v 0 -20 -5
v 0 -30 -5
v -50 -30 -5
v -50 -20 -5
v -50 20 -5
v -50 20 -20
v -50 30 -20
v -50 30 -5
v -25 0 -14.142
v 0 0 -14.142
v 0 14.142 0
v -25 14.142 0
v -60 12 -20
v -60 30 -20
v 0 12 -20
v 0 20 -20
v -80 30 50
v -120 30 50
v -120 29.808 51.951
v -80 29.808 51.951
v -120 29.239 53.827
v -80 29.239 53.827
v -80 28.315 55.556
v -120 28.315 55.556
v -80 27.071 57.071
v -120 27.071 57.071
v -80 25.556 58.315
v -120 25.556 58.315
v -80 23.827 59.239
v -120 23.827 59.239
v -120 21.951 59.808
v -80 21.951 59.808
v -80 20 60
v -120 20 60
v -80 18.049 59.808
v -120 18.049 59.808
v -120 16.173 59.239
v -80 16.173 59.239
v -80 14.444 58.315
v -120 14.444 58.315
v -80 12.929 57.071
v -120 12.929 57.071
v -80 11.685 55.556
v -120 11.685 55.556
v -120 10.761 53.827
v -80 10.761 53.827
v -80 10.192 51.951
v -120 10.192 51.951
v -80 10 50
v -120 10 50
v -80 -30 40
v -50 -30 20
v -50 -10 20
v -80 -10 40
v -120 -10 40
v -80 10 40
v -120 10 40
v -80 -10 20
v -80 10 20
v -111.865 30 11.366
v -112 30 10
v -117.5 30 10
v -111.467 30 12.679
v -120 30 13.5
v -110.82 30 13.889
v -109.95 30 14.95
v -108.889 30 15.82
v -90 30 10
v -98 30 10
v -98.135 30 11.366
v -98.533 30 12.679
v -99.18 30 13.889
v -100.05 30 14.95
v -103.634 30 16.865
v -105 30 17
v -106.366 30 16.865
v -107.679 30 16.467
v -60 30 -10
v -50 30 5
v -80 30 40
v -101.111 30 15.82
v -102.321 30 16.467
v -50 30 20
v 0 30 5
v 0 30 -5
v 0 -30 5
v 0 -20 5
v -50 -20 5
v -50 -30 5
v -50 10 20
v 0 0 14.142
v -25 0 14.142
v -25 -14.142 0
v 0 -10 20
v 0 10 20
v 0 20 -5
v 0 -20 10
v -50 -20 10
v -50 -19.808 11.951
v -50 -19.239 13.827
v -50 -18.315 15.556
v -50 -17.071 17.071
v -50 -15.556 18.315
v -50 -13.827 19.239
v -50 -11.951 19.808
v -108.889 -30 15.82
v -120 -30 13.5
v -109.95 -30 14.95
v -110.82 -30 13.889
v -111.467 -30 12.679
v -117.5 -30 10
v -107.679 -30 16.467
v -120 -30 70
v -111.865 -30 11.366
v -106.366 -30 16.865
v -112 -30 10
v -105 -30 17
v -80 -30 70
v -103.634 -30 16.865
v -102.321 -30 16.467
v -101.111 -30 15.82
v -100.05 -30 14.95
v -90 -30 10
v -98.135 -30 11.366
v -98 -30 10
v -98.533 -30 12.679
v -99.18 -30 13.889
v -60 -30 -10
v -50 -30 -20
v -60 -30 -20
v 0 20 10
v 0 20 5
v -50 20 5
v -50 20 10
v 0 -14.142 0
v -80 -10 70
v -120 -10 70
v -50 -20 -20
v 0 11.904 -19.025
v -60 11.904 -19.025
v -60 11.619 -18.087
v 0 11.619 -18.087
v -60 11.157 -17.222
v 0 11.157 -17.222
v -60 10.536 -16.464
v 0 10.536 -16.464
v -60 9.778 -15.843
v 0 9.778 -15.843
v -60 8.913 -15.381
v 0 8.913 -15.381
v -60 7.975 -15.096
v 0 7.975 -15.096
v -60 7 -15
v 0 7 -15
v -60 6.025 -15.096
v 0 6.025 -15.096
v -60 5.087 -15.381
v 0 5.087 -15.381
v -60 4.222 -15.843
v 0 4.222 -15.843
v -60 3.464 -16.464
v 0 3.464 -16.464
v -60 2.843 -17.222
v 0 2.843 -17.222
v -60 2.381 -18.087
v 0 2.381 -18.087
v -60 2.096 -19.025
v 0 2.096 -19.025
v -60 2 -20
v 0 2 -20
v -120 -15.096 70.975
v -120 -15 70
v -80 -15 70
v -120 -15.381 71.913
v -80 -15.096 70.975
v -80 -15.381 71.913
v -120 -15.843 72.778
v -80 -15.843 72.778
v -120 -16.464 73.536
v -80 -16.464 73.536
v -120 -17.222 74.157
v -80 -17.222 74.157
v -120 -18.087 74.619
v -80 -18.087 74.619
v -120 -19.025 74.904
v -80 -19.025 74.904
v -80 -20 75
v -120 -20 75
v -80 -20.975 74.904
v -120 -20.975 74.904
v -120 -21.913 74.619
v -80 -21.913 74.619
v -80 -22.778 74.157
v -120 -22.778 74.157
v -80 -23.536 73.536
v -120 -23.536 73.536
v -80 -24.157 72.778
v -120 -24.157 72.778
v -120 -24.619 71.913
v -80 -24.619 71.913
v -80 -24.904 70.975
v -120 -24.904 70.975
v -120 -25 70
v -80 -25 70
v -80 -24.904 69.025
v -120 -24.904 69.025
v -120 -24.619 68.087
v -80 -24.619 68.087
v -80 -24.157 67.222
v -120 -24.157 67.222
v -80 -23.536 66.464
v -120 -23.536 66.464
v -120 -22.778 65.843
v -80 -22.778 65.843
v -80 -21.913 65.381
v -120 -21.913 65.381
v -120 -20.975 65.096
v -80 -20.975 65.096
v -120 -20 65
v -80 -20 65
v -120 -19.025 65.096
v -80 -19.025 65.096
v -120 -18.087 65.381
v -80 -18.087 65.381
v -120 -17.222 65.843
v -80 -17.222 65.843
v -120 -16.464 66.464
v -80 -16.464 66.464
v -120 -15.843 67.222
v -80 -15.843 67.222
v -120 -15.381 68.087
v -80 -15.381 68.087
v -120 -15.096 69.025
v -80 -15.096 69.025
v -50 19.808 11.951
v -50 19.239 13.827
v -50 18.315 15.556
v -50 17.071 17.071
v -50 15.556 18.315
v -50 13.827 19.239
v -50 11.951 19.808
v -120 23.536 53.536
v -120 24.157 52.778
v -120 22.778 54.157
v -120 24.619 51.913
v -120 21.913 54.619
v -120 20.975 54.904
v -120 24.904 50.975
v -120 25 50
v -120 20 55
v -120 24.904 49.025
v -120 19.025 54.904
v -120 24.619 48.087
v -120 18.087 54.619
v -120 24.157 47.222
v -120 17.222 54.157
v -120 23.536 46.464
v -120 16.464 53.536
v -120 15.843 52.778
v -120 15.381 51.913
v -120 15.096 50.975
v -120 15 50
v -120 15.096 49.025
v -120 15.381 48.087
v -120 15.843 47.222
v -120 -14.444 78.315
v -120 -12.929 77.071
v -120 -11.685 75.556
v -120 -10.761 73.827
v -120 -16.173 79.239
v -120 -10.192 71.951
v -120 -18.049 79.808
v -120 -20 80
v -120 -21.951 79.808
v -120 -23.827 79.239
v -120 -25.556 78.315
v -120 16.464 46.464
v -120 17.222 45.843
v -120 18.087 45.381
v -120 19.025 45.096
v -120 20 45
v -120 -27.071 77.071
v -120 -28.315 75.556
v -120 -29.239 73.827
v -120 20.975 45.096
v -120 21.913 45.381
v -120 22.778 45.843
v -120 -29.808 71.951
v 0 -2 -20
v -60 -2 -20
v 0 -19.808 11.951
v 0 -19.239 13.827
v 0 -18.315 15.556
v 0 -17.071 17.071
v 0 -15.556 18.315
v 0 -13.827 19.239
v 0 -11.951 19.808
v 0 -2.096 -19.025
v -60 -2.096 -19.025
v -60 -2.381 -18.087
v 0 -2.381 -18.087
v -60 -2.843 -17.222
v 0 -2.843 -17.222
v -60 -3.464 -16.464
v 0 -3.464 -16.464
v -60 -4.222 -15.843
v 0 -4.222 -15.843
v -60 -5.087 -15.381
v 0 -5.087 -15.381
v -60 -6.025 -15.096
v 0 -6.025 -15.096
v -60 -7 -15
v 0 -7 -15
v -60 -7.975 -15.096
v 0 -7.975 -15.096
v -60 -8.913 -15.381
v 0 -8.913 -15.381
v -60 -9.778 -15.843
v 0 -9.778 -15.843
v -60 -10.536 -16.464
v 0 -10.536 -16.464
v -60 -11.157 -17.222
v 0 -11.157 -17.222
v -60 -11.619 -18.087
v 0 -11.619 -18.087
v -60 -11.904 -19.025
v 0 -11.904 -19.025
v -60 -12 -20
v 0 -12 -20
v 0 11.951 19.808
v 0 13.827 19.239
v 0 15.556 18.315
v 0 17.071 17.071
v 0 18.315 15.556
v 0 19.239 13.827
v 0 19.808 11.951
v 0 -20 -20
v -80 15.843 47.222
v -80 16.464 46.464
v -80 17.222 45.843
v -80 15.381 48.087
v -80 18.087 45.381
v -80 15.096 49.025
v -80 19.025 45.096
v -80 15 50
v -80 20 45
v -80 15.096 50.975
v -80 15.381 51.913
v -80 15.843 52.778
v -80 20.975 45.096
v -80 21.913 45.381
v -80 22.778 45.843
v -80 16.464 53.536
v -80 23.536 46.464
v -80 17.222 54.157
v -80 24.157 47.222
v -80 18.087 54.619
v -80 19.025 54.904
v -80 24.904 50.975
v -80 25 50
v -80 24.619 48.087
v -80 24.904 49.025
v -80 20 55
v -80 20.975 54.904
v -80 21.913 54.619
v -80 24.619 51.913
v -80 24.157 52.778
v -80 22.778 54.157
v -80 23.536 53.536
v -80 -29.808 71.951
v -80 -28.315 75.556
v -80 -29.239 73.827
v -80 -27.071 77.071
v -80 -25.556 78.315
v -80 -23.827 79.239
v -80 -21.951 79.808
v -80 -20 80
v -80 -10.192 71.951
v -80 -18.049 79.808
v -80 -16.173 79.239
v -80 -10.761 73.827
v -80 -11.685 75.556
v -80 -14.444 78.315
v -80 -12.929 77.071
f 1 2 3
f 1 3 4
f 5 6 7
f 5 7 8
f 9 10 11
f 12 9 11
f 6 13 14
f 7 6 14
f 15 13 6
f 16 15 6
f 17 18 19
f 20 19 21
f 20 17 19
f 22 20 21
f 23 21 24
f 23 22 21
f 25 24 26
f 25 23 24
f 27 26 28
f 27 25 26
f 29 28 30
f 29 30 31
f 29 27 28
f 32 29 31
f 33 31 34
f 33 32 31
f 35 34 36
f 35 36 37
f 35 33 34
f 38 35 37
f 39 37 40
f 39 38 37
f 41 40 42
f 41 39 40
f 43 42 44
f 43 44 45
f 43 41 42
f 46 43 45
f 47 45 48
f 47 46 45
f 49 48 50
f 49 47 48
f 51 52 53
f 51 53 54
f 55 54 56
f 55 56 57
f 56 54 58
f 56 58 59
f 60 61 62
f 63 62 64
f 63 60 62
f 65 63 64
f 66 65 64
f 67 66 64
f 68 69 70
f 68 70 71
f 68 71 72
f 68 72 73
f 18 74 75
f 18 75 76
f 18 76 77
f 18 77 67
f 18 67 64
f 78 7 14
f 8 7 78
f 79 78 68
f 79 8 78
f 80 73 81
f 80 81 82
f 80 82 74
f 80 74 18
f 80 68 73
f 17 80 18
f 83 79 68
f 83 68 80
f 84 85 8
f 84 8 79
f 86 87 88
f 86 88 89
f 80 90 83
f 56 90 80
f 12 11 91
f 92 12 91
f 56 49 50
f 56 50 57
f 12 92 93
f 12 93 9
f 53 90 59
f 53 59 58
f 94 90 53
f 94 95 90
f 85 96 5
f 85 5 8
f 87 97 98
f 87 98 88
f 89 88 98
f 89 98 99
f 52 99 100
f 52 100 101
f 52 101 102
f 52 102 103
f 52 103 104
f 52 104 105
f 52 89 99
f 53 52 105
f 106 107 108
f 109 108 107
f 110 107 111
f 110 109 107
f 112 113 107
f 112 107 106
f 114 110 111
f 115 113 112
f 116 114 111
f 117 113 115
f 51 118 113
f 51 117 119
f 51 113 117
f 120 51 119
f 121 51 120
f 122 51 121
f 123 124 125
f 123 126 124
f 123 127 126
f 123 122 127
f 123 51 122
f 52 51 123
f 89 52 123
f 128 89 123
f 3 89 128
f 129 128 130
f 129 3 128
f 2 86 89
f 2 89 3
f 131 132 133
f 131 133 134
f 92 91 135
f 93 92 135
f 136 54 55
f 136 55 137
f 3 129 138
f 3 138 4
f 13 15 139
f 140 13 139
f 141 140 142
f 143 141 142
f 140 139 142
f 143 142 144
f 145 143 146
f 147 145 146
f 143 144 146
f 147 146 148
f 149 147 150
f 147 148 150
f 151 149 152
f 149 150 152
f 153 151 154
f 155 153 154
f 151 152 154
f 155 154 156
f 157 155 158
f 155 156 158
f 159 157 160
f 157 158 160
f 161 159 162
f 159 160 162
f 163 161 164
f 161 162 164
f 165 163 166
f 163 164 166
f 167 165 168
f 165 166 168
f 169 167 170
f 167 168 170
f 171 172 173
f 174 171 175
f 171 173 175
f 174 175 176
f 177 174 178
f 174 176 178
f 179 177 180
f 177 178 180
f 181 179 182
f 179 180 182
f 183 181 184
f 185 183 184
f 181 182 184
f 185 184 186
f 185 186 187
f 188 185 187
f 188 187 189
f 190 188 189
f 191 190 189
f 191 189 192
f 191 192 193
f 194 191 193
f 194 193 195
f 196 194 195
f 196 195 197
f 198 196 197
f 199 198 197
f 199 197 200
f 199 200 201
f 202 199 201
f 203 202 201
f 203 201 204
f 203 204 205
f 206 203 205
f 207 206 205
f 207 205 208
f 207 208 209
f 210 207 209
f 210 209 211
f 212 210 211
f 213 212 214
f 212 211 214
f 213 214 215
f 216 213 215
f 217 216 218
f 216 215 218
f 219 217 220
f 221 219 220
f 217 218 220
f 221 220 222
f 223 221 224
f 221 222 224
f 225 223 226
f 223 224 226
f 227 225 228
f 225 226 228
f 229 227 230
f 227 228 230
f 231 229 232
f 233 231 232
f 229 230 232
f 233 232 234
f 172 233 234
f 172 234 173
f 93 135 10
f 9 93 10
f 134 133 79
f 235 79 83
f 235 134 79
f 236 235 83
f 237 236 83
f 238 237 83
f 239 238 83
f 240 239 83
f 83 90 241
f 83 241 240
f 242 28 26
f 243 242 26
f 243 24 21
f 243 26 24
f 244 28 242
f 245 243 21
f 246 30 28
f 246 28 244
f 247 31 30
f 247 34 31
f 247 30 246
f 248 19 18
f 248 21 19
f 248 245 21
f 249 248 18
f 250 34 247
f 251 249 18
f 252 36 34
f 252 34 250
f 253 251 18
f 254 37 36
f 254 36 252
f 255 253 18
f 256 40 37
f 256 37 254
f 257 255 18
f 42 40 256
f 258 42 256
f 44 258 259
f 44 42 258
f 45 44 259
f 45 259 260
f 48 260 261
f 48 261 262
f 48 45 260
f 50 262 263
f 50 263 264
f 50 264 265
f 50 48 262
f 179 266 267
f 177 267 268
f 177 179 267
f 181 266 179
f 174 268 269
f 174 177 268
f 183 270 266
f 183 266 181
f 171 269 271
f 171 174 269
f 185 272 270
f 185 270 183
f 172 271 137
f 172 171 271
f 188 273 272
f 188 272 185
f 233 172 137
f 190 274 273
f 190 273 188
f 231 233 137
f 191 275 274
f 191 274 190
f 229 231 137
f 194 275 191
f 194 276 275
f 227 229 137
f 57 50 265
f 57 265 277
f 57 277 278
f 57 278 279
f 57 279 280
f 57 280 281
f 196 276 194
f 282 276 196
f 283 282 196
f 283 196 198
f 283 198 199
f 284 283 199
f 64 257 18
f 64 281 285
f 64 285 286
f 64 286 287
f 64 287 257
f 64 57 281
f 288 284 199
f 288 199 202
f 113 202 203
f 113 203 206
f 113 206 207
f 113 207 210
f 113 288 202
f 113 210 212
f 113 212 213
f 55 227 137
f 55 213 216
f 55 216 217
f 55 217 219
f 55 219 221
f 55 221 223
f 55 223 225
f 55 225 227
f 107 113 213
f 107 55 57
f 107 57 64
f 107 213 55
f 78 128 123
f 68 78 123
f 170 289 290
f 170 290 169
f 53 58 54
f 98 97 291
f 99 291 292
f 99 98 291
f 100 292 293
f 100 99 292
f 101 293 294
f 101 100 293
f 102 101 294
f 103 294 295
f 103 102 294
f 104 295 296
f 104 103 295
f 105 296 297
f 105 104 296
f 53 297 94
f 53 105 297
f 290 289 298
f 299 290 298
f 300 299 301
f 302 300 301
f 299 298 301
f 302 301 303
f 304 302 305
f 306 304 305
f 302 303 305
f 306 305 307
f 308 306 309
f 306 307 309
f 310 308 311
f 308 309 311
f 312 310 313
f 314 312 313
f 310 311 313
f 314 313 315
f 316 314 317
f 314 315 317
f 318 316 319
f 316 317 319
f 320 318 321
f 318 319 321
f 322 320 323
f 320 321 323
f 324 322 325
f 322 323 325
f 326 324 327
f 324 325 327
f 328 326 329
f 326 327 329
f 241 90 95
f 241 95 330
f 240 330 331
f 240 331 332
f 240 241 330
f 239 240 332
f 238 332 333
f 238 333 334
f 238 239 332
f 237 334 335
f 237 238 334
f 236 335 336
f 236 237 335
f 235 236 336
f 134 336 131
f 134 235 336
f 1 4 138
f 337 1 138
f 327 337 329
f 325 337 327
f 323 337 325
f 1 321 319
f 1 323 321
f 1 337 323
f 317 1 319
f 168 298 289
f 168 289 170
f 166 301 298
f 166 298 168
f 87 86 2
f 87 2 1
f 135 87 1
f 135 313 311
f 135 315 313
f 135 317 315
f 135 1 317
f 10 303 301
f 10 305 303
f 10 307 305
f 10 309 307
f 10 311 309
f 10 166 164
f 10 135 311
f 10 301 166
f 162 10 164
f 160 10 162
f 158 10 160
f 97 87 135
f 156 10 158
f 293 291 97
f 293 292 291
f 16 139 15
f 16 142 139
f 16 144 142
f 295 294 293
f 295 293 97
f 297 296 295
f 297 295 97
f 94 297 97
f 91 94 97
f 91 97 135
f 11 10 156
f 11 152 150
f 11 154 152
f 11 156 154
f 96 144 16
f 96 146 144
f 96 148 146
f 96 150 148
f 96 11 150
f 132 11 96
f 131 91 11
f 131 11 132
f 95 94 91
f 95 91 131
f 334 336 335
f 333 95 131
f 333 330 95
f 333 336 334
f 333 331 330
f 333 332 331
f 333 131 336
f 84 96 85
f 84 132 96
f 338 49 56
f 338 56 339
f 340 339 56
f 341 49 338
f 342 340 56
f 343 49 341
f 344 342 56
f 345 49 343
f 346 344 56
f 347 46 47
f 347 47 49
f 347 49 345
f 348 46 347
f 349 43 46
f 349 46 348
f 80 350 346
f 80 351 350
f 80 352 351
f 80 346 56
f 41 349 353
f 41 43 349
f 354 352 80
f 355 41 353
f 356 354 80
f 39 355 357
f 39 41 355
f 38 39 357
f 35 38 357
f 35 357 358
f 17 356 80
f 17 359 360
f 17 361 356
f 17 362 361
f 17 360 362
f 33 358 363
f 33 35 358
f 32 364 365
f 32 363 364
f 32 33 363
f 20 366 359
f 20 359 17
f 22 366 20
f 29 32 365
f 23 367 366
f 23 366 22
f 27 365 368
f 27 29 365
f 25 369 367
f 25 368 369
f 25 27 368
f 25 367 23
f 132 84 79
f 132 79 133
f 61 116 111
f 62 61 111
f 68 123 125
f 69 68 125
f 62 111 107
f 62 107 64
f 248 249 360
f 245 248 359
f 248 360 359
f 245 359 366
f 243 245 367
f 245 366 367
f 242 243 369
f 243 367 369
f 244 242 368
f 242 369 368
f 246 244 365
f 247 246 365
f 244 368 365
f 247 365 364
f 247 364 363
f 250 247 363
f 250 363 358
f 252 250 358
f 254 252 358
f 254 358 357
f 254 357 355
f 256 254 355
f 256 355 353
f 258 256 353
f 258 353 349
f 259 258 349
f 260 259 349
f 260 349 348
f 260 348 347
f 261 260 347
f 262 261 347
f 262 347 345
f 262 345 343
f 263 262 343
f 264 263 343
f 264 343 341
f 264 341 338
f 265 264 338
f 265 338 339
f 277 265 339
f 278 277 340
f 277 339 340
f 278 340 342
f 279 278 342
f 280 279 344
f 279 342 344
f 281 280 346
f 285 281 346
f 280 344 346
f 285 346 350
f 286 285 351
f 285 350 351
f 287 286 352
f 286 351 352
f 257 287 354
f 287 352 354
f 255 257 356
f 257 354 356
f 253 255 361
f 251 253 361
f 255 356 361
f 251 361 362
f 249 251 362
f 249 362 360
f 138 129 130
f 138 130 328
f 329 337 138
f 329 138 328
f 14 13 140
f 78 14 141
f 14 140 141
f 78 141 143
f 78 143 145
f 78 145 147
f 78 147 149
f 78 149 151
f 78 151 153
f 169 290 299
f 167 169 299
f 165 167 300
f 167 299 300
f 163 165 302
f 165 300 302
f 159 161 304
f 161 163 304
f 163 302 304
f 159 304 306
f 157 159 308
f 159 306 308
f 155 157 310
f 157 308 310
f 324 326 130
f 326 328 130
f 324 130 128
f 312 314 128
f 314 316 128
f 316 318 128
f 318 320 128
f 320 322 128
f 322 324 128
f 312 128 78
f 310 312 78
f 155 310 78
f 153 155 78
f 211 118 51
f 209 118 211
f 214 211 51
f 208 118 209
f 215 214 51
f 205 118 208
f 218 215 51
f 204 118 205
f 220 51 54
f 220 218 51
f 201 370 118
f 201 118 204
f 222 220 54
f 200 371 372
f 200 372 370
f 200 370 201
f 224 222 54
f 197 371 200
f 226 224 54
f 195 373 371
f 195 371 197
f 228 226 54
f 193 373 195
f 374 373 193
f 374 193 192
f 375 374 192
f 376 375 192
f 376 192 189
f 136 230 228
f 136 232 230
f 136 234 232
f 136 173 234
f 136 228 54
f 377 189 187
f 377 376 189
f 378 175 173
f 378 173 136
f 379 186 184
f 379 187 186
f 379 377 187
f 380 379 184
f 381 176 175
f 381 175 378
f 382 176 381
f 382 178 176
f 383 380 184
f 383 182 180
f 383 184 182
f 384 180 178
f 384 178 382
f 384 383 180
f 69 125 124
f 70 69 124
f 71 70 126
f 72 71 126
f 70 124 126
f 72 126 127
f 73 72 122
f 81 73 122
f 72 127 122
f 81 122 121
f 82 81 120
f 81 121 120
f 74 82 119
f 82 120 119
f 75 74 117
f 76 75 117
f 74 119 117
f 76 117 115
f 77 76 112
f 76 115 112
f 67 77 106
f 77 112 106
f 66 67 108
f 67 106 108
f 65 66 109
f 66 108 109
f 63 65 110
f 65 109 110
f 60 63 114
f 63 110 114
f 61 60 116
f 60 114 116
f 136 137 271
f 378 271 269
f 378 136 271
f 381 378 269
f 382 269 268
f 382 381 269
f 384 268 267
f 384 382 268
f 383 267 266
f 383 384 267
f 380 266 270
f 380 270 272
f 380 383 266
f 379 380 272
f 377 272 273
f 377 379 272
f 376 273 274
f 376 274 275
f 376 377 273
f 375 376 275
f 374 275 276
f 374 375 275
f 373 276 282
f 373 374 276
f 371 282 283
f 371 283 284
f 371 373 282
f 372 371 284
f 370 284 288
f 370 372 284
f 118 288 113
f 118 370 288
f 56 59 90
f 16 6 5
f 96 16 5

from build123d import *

# Parameters (mm, degrees)
F1_DEPTH      = 30
F1_DEPTH_BACK = 30
F3_W          = 20
F3_H          = 96
F4_DEPTH      = 30
F6_DEPTH      = 40
F8_DEPTH      = 90
F9_DEPTH      = 60.001
F11_DEPTH     = 25
F12_R         = 9.99999
F13_R         = 5
F14_DEPTH     = 120.001
F15_R         = 5
F16_DEPTH     = 40.001
F17_SIZE2     = 2.5
F17_SIZE      = 3.5
F18_R         = 7
F19_DEPTH     = 60.001


# Not quite as in the source:
# - a fillet or chamfer is up to 0.001 mm smaller than in the source, because OpenCascade refuses the exact size


with BuildPart() as f1:
    # F0 (on Front) → F1 (new body, two sides)
    with BuildSketch(Plane.XZ) as f1_sk:
        Polygon((-80, 40), (-120, 40), (-120, -20), (-50, -20), (-50, 20), align=None)
    extrude(amount=F1_DEPTH)
    extrude(f1_sk.sketch, amount=-F1_DEPTH_BACK)

    # F3 (on face) → F4 (cut)
    with BuildSketch(Plane.YZ.offset(-50)):
        Rectangle(F3_W, F3_H)
    extrude(amount=-F4_DEPTH, mode=Mode.SUBTRACT)

    # F5 (on face) → F6 (join)
    with BuildSketch(Plane.YZ.offset(-80)):
        with BuildLine():
            Line((-30, 20), (-10, 20))
            Line((-10, 20), (-10, 70))
            ThreePointArc((-10, 70), (-20, 80), (-30, 70))
            Line((-30, 70), (-30, 20))
        make_face()
        with BuildLine():
            Line((10, 50), (10, 20))
            Line((10, 20), (30, 20))
            Line((30, 20), (30, 50))
            ThreePointArc((30, 50), (20, 60), (10, 50))
        make_face()
    extrude(amount=-F6_DEPTH)

    # F7 (on Right) → F8 (join)
    with BuildSketch(Plane.YZ):
        Polygon((-20, 5), (-30, 5), (-30, -5), (-20, -5), (-20, -20), (20, -20), (20, -5), (30, -5), (30, 5), (20, 5), (20, 20), (-20, 20), align=None)
    extrude(amount=-F8_DEPTH)

    # F2 (on face) → F9 (cut, through all)
    with BuildSketch(Plane.XZ.offset(30)):
        Polygon((-90, 10), (-128, 10), (-128, -28), (-60, -28), (-60, -10), align=None)
    extrude(amount=-F9_DEPTH, mode=Mode.SUBTRACT)

    # F10 (on face) → F11 (cut)
    with BuildSketch(Plane.YZ):
        Polygon((0, 14.1421356237), (-14.1421356237, 0), (0, -14.1421356237), (14.1421356237, 0), align=None)
    extrude(amount=-F11_DEPTH, mode=Mode.SUBTRACT)

    # F12 (radius 10 in the source; OpenCascade refuses exactly that, so slightly less here)
    f12_edges = [f1.edges().sort_by_distance(p)[0] for p in [
        (-25, 20, 20),
        (-25, -20, 20),
    ]]
    fillet(f12_edges, radius=F12_R)

    # F13 (on face) → F14 (cut, through all)
    with BuildSketch(Plane.YZ):
        with Locations((-7, -20)):
            Circle(F13_R)
        with Locations((7, -20)):
            Circle(F13_R)
    extrude(amount=-F14_DEPTH, mode=Mode.SUBTRACT)

    # F15 (on face) → F16 (cut, through all)
    with BuildSketch(Plane.YZ.offset(-80)):
        with Locations((-20, 70)):
            Circle(F15_R)
        with Locations((20, 50)):
            Circle(F15_R)
    extrude(amount=-F16_DEPTH, mode=Mode.SUBTRACT)

    # F17
    f17_edges = [f1.edges().sort_by_distance(p)[0] for p in [
        (-120, 0, 10),
    ]]
    chamfer(f17_edges, length=F17_SIZE, length2=F17_SIZE2)

    # F18 (on face) → F19 (cut, through all)
    with BuildSketch(Plane.XZ.offset(30)):
        with Locations((-105, 10)):
            Circle(F18_R)
    extrude(amount=-F19_DEPTH, mode=Mode.SUBTRACT)


solid = f1.part
